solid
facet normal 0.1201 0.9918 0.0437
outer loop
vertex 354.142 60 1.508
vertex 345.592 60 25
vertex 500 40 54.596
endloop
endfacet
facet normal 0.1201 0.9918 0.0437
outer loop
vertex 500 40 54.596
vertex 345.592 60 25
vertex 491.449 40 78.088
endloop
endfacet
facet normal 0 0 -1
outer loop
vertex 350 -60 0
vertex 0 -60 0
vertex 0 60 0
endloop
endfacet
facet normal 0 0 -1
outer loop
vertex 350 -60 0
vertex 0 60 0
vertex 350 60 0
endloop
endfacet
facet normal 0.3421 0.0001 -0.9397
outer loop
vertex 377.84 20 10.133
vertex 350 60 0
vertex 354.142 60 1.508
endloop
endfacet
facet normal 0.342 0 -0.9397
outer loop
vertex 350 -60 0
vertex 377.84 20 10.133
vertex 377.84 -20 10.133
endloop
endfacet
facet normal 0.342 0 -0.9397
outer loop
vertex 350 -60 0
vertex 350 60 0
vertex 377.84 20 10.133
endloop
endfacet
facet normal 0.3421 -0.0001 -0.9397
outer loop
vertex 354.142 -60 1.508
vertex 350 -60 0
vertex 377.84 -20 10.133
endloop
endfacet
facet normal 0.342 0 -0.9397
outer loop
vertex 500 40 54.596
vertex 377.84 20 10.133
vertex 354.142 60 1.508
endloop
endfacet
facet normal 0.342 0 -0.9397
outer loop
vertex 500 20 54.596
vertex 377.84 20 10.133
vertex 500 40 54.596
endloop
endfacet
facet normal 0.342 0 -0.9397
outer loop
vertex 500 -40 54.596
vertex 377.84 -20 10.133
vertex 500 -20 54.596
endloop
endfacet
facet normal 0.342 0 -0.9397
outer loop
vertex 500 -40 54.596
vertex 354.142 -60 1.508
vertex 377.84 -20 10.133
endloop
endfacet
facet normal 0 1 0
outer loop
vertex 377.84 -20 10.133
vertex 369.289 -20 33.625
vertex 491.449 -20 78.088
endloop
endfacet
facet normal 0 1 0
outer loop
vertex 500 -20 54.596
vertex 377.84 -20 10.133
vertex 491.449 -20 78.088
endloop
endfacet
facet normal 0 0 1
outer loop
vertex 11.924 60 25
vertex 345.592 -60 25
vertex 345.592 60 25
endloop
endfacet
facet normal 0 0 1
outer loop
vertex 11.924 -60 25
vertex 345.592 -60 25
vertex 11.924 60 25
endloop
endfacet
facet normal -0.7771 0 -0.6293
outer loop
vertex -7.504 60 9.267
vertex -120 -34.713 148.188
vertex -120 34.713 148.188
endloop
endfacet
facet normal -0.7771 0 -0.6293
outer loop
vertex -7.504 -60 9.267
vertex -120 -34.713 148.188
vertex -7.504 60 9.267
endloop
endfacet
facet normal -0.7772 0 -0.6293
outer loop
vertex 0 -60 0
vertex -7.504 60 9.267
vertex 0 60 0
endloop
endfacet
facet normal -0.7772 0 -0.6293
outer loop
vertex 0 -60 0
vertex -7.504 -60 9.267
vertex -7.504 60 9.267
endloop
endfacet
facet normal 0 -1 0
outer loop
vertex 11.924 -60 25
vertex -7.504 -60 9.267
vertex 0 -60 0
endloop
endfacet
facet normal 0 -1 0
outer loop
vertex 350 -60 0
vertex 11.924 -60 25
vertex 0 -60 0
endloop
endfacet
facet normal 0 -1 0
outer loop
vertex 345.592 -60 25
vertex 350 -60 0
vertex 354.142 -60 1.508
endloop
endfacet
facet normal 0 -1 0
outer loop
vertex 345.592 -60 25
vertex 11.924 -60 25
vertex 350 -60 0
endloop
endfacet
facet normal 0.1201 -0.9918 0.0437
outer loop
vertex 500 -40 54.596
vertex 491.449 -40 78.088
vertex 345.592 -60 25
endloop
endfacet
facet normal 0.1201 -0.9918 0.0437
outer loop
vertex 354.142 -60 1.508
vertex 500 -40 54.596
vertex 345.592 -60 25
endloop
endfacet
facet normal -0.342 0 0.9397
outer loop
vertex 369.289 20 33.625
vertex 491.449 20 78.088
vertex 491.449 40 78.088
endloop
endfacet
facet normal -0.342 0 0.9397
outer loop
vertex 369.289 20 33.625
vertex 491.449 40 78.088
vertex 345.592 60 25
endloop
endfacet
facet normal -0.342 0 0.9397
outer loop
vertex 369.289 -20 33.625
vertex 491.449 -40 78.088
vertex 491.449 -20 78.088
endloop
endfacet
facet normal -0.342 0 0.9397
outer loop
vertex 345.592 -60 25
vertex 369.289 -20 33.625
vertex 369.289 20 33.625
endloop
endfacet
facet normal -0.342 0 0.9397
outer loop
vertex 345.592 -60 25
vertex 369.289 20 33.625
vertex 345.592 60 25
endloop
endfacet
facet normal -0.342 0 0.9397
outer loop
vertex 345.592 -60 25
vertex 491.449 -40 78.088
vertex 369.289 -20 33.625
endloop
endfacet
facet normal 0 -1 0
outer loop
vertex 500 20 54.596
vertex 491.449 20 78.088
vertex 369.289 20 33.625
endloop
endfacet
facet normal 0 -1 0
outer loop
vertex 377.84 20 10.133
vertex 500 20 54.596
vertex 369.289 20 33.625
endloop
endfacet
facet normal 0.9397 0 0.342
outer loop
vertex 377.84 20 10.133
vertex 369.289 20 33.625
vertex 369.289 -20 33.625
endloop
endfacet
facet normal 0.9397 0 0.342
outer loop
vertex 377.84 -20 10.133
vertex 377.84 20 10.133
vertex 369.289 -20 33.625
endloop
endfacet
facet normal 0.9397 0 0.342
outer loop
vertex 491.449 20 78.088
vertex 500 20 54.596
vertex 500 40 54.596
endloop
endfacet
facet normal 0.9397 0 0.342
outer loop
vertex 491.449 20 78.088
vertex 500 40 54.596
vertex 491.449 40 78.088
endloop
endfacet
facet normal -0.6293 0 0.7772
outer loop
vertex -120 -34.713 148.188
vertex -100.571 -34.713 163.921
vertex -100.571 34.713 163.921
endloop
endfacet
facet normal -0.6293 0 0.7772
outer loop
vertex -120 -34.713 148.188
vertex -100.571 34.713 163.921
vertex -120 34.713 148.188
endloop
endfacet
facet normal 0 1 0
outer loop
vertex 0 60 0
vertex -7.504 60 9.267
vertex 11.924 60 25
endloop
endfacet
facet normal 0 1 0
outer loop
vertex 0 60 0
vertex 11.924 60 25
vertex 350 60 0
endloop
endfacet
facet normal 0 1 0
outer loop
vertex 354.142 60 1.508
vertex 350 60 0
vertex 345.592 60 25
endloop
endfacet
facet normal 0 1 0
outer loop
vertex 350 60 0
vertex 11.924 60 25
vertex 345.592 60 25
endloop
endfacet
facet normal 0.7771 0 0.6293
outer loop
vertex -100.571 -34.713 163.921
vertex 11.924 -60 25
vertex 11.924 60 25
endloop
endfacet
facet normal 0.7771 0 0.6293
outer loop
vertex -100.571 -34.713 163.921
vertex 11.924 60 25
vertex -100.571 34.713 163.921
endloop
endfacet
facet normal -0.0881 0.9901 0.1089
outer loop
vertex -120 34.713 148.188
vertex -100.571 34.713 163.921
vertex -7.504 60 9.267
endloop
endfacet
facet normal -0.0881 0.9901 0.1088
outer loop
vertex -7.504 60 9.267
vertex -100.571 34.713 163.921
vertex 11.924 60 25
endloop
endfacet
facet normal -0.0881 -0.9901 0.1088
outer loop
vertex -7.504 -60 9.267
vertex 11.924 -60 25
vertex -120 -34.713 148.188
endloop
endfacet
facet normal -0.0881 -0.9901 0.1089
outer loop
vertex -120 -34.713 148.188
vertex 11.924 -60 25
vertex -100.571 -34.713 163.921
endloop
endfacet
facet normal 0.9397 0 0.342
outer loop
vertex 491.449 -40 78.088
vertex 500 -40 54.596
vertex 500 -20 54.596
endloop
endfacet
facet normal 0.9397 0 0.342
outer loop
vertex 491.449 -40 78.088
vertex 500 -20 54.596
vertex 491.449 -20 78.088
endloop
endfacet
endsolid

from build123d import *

# Parameters (mm, degrees)
F1_DEPTH = 60
F3_DEPTH = 25
F5_DEPTH = 25


with BuildPart() as f1:
    # F0 (on Front) → F1 (new body, symmetric)
    with BuildSketch(Plane.XZ):
        Polygon((-120, 148.1876587842), (0, 0), (350, 0), (500, 54.5955351399), (491.4494964169, 78.0878506596), (345.5918254823, 25), (11.9243883175, 25), (-100.5713509636, 163.9206685605), align=None)
    extrude(amount=F1_DEPTH, both=True)

    # F2 (on face) → F3 (cut)
    with BuildSketch(Plane(origin=(19.4286490364, 0, 15.7330097762), x_dir=(0, 1, 0), z_dir=(0.7771459615, 0, 0.629320391))):
        Polygon((-60, 190.6818874879), (-60, 11.9243883175), (-34.7125157714, 190.6818874879), align=None)
        Polygon((34.7125157714, 190.6818874879), (60, 11.9243883175), (60, 190.6818874879), align=None)
    extrude(amount=-F3_DEPTH, mode=Mode.SUBTRACT)

    # F4 (on face) → F5 (cut)
    with BuildSketch(Plane(origin=(32.391718871, 0, -88.9955161755), x_dir=(0.9396926208, 0, 0.3420201433), z_dir=(-0.3420201433, 0, 0.9396926208))):
        Polygon((488.5190831465, 60), (333.3005917928, 60), (488.5190831465, 40), align=None)
        Polygon((358.5190831465, -20), (488.5190831465, -20), (488.5190831465, 20), (358.5190831465, 20), (358.5190831465, 0), align=None)
        Polygon((488.5190831465, -40), (333.3005917928, -60), (488.5190831465, -60), align=None)
    extrude(amount=-F5_DEPTH, mode=Mode.SUBTRACT)


solid = f1.part
